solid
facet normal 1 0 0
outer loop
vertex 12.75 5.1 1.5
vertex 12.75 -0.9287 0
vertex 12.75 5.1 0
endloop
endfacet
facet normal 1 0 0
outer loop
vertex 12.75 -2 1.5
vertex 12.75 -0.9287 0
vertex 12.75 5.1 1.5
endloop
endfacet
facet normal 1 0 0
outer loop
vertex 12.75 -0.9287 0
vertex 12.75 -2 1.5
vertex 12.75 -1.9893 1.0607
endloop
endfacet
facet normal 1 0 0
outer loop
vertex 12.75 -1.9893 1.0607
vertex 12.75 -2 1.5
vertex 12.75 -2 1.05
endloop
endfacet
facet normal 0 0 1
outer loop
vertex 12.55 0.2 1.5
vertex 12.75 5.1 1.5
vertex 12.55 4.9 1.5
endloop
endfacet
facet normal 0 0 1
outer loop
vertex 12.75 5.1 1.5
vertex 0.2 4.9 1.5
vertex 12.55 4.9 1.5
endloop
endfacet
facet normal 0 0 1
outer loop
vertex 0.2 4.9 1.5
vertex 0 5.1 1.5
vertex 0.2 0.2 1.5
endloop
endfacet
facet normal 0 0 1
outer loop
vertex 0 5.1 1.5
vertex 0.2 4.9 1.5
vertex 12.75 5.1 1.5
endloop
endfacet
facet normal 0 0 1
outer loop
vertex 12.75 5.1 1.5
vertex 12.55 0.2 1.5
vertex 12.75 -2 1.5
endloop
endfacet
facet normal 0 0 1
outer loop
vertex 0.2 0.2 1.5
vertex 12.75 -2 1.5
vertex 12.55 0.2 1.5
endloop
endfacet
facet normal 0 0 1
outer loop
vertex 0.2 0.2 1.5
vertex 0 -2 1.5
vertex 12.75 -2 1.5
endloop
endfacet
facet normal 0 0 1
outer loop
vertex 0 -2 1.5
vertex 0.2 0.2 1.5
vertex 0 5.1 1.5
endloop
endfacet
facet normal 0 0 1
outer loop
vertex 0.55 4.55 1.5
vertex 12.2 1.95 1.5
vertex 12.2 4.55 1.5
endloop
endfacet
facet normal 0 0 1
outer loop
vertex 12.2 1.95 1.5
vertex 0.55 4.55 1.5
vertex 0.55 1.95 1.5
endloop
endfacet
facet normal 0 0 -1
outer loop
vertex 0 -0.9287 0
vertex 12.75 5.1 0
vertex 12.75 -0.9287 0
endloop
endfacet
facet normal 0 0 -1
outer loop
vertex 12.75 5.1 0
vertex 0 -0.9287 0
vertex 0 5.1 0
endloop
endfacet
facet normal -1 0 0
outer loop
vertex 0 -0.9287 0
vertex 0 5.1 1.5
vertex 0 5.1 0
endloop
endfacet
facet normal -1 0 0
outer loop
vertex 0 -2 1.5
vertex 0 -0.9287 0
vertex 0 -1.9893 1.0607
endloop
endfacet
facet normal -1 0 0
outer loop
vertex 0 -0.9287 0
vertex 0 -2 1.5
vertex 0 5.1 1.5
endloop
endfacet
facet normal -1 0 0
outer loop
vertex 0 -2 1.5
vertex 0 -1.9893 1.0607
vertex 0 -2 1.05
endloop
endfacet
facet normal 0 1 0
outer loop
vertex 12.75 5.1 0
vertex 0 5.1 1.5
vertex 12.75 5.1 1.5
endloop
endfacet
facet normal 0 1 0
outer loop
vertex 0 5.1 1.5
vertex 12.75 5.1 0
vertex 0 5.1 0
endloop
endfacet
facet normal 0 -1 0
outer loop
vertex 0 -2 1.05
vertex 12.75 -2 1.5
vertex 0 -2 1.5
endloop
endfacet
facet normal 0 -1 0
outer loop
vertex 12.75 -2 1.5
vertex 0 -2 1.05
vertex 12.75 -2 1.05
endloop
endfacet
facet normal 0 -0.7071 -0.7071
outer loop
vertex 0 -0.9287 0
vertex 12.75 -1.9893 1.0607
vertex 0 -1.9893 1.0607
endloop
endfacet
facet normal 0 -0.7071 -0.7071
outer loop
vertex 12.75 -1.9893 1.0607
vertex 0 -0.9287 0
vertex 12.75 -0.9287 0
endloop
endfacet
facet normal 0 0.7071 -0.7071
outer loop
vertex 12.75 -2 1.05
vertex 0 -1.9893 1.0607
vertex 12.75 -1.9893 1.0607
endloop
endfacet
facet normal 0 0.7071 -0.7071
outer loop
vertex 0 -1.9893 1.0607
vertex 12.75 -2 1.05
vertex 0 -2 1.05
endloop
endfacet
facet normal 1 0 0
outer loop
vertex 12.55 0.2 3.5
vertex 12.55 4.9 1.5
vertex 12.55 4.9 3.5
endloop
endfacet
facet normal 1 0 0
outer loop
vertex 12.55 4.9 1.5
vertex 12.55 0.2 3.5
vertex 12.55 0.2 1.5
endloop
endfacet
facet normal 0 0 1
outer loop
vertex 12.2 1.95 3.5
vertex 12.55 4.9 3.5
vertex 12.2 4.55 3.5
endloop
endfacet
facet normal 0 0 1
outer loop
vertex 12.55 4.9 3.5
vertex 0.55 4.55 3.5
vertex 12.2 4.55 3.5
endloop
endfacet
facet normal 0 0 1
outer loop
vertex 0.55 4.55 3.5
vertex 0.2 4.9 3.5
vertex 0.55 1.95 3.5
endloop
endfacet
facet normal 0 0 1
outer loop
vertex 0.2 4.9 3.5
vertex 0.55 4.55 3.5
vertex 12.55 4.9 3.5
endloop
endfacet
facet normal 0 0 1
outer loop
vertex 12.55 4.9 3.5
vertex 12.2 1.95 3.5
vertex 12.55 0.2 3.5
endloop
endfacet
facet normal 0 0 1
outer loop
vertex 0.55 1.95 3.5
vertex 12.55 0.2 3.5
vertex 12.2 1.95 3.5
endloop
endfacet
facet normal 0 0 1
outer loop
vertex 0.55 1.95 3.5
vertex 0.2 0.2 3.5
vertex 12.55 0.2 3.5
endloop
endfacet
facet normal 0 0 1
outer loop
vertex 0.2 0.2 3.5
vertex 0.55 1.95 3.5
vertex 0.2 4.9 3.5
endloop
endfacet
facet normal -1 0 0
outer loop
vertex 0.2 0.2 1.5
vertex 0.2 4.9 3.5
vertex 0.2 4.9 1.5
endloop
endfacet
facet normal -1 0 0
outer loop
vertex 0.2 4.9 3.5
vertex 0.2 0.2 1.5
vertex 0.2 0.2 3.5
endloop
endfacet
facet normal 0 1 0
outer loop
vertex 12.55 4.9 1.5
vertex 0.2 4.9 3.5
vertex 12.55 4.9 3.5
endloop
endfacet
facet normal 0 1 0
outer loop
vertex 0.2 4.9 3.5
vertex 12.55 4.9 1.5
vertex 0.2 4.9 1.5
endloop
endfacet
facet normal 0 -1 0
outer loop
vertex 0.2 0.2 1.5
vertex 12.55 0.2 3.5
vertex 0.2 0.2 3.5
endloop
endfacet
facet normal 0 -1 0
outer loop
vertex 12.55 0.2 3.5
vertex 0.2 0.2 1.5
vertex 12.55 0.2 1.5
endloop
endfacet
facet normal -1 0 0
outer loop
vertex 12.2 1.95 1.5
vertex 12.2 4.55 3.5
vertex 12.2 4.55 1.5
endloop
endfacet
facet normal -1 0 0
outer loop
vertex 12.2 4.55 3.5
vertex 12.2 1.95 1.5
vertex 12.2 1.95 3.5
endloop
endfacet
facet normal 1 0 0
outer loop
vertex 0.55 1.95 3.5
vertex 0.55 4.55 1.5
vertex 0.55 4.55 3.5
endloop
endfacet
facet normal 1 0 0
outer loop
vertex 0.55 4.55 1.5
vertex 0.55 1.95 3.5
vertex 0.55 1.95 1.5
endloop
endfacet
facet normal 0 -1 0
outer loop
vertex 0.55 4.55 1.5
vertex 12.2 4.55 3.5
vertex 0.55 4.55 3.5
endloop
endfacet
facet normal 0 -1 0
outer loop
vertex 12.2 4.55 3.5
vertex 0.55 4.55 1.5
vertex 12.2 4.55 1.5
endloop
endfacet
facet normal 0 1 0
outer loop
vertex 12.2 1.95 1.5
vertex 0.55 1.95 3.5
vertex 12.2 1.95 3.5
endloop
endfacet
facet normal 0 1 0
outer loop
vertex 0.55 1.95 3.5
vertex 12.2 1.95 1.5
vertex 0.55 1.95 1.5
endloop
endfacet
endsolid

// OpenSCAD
eps = 0.01;
// basic dimensions
// [mm]
x = 12.75;
y = 5.1;
// cover thickness
t = 1.5;
// depth to the USB
d = 2;
// y overlap
y_ol = 2;

// wall thickness on all others sides
wt = 0.35;
wto = 0.2;
// wall thickness on the bellow
WT = 1.75;


// lower part
difference()
{
    translate([0,-y_ol,0]) cube([x,y+y_ol,t]);
    translate([-eps,-3.05,-0]) rotate([-45,0,0]) cube([x+2*eps,t,t]);
        
}
// upper part
translate([wto,wto,t])
    difference()
    {
        //cube([x-2*wt,y-wt-WT,d]);
        cube([x-2*wto,y-2*wto,d]);
        translate([wt,WT,-eps]) cube([x-2*wt-2*wto,y-wt-WT-2*wto,2*eps+d]);
    }
